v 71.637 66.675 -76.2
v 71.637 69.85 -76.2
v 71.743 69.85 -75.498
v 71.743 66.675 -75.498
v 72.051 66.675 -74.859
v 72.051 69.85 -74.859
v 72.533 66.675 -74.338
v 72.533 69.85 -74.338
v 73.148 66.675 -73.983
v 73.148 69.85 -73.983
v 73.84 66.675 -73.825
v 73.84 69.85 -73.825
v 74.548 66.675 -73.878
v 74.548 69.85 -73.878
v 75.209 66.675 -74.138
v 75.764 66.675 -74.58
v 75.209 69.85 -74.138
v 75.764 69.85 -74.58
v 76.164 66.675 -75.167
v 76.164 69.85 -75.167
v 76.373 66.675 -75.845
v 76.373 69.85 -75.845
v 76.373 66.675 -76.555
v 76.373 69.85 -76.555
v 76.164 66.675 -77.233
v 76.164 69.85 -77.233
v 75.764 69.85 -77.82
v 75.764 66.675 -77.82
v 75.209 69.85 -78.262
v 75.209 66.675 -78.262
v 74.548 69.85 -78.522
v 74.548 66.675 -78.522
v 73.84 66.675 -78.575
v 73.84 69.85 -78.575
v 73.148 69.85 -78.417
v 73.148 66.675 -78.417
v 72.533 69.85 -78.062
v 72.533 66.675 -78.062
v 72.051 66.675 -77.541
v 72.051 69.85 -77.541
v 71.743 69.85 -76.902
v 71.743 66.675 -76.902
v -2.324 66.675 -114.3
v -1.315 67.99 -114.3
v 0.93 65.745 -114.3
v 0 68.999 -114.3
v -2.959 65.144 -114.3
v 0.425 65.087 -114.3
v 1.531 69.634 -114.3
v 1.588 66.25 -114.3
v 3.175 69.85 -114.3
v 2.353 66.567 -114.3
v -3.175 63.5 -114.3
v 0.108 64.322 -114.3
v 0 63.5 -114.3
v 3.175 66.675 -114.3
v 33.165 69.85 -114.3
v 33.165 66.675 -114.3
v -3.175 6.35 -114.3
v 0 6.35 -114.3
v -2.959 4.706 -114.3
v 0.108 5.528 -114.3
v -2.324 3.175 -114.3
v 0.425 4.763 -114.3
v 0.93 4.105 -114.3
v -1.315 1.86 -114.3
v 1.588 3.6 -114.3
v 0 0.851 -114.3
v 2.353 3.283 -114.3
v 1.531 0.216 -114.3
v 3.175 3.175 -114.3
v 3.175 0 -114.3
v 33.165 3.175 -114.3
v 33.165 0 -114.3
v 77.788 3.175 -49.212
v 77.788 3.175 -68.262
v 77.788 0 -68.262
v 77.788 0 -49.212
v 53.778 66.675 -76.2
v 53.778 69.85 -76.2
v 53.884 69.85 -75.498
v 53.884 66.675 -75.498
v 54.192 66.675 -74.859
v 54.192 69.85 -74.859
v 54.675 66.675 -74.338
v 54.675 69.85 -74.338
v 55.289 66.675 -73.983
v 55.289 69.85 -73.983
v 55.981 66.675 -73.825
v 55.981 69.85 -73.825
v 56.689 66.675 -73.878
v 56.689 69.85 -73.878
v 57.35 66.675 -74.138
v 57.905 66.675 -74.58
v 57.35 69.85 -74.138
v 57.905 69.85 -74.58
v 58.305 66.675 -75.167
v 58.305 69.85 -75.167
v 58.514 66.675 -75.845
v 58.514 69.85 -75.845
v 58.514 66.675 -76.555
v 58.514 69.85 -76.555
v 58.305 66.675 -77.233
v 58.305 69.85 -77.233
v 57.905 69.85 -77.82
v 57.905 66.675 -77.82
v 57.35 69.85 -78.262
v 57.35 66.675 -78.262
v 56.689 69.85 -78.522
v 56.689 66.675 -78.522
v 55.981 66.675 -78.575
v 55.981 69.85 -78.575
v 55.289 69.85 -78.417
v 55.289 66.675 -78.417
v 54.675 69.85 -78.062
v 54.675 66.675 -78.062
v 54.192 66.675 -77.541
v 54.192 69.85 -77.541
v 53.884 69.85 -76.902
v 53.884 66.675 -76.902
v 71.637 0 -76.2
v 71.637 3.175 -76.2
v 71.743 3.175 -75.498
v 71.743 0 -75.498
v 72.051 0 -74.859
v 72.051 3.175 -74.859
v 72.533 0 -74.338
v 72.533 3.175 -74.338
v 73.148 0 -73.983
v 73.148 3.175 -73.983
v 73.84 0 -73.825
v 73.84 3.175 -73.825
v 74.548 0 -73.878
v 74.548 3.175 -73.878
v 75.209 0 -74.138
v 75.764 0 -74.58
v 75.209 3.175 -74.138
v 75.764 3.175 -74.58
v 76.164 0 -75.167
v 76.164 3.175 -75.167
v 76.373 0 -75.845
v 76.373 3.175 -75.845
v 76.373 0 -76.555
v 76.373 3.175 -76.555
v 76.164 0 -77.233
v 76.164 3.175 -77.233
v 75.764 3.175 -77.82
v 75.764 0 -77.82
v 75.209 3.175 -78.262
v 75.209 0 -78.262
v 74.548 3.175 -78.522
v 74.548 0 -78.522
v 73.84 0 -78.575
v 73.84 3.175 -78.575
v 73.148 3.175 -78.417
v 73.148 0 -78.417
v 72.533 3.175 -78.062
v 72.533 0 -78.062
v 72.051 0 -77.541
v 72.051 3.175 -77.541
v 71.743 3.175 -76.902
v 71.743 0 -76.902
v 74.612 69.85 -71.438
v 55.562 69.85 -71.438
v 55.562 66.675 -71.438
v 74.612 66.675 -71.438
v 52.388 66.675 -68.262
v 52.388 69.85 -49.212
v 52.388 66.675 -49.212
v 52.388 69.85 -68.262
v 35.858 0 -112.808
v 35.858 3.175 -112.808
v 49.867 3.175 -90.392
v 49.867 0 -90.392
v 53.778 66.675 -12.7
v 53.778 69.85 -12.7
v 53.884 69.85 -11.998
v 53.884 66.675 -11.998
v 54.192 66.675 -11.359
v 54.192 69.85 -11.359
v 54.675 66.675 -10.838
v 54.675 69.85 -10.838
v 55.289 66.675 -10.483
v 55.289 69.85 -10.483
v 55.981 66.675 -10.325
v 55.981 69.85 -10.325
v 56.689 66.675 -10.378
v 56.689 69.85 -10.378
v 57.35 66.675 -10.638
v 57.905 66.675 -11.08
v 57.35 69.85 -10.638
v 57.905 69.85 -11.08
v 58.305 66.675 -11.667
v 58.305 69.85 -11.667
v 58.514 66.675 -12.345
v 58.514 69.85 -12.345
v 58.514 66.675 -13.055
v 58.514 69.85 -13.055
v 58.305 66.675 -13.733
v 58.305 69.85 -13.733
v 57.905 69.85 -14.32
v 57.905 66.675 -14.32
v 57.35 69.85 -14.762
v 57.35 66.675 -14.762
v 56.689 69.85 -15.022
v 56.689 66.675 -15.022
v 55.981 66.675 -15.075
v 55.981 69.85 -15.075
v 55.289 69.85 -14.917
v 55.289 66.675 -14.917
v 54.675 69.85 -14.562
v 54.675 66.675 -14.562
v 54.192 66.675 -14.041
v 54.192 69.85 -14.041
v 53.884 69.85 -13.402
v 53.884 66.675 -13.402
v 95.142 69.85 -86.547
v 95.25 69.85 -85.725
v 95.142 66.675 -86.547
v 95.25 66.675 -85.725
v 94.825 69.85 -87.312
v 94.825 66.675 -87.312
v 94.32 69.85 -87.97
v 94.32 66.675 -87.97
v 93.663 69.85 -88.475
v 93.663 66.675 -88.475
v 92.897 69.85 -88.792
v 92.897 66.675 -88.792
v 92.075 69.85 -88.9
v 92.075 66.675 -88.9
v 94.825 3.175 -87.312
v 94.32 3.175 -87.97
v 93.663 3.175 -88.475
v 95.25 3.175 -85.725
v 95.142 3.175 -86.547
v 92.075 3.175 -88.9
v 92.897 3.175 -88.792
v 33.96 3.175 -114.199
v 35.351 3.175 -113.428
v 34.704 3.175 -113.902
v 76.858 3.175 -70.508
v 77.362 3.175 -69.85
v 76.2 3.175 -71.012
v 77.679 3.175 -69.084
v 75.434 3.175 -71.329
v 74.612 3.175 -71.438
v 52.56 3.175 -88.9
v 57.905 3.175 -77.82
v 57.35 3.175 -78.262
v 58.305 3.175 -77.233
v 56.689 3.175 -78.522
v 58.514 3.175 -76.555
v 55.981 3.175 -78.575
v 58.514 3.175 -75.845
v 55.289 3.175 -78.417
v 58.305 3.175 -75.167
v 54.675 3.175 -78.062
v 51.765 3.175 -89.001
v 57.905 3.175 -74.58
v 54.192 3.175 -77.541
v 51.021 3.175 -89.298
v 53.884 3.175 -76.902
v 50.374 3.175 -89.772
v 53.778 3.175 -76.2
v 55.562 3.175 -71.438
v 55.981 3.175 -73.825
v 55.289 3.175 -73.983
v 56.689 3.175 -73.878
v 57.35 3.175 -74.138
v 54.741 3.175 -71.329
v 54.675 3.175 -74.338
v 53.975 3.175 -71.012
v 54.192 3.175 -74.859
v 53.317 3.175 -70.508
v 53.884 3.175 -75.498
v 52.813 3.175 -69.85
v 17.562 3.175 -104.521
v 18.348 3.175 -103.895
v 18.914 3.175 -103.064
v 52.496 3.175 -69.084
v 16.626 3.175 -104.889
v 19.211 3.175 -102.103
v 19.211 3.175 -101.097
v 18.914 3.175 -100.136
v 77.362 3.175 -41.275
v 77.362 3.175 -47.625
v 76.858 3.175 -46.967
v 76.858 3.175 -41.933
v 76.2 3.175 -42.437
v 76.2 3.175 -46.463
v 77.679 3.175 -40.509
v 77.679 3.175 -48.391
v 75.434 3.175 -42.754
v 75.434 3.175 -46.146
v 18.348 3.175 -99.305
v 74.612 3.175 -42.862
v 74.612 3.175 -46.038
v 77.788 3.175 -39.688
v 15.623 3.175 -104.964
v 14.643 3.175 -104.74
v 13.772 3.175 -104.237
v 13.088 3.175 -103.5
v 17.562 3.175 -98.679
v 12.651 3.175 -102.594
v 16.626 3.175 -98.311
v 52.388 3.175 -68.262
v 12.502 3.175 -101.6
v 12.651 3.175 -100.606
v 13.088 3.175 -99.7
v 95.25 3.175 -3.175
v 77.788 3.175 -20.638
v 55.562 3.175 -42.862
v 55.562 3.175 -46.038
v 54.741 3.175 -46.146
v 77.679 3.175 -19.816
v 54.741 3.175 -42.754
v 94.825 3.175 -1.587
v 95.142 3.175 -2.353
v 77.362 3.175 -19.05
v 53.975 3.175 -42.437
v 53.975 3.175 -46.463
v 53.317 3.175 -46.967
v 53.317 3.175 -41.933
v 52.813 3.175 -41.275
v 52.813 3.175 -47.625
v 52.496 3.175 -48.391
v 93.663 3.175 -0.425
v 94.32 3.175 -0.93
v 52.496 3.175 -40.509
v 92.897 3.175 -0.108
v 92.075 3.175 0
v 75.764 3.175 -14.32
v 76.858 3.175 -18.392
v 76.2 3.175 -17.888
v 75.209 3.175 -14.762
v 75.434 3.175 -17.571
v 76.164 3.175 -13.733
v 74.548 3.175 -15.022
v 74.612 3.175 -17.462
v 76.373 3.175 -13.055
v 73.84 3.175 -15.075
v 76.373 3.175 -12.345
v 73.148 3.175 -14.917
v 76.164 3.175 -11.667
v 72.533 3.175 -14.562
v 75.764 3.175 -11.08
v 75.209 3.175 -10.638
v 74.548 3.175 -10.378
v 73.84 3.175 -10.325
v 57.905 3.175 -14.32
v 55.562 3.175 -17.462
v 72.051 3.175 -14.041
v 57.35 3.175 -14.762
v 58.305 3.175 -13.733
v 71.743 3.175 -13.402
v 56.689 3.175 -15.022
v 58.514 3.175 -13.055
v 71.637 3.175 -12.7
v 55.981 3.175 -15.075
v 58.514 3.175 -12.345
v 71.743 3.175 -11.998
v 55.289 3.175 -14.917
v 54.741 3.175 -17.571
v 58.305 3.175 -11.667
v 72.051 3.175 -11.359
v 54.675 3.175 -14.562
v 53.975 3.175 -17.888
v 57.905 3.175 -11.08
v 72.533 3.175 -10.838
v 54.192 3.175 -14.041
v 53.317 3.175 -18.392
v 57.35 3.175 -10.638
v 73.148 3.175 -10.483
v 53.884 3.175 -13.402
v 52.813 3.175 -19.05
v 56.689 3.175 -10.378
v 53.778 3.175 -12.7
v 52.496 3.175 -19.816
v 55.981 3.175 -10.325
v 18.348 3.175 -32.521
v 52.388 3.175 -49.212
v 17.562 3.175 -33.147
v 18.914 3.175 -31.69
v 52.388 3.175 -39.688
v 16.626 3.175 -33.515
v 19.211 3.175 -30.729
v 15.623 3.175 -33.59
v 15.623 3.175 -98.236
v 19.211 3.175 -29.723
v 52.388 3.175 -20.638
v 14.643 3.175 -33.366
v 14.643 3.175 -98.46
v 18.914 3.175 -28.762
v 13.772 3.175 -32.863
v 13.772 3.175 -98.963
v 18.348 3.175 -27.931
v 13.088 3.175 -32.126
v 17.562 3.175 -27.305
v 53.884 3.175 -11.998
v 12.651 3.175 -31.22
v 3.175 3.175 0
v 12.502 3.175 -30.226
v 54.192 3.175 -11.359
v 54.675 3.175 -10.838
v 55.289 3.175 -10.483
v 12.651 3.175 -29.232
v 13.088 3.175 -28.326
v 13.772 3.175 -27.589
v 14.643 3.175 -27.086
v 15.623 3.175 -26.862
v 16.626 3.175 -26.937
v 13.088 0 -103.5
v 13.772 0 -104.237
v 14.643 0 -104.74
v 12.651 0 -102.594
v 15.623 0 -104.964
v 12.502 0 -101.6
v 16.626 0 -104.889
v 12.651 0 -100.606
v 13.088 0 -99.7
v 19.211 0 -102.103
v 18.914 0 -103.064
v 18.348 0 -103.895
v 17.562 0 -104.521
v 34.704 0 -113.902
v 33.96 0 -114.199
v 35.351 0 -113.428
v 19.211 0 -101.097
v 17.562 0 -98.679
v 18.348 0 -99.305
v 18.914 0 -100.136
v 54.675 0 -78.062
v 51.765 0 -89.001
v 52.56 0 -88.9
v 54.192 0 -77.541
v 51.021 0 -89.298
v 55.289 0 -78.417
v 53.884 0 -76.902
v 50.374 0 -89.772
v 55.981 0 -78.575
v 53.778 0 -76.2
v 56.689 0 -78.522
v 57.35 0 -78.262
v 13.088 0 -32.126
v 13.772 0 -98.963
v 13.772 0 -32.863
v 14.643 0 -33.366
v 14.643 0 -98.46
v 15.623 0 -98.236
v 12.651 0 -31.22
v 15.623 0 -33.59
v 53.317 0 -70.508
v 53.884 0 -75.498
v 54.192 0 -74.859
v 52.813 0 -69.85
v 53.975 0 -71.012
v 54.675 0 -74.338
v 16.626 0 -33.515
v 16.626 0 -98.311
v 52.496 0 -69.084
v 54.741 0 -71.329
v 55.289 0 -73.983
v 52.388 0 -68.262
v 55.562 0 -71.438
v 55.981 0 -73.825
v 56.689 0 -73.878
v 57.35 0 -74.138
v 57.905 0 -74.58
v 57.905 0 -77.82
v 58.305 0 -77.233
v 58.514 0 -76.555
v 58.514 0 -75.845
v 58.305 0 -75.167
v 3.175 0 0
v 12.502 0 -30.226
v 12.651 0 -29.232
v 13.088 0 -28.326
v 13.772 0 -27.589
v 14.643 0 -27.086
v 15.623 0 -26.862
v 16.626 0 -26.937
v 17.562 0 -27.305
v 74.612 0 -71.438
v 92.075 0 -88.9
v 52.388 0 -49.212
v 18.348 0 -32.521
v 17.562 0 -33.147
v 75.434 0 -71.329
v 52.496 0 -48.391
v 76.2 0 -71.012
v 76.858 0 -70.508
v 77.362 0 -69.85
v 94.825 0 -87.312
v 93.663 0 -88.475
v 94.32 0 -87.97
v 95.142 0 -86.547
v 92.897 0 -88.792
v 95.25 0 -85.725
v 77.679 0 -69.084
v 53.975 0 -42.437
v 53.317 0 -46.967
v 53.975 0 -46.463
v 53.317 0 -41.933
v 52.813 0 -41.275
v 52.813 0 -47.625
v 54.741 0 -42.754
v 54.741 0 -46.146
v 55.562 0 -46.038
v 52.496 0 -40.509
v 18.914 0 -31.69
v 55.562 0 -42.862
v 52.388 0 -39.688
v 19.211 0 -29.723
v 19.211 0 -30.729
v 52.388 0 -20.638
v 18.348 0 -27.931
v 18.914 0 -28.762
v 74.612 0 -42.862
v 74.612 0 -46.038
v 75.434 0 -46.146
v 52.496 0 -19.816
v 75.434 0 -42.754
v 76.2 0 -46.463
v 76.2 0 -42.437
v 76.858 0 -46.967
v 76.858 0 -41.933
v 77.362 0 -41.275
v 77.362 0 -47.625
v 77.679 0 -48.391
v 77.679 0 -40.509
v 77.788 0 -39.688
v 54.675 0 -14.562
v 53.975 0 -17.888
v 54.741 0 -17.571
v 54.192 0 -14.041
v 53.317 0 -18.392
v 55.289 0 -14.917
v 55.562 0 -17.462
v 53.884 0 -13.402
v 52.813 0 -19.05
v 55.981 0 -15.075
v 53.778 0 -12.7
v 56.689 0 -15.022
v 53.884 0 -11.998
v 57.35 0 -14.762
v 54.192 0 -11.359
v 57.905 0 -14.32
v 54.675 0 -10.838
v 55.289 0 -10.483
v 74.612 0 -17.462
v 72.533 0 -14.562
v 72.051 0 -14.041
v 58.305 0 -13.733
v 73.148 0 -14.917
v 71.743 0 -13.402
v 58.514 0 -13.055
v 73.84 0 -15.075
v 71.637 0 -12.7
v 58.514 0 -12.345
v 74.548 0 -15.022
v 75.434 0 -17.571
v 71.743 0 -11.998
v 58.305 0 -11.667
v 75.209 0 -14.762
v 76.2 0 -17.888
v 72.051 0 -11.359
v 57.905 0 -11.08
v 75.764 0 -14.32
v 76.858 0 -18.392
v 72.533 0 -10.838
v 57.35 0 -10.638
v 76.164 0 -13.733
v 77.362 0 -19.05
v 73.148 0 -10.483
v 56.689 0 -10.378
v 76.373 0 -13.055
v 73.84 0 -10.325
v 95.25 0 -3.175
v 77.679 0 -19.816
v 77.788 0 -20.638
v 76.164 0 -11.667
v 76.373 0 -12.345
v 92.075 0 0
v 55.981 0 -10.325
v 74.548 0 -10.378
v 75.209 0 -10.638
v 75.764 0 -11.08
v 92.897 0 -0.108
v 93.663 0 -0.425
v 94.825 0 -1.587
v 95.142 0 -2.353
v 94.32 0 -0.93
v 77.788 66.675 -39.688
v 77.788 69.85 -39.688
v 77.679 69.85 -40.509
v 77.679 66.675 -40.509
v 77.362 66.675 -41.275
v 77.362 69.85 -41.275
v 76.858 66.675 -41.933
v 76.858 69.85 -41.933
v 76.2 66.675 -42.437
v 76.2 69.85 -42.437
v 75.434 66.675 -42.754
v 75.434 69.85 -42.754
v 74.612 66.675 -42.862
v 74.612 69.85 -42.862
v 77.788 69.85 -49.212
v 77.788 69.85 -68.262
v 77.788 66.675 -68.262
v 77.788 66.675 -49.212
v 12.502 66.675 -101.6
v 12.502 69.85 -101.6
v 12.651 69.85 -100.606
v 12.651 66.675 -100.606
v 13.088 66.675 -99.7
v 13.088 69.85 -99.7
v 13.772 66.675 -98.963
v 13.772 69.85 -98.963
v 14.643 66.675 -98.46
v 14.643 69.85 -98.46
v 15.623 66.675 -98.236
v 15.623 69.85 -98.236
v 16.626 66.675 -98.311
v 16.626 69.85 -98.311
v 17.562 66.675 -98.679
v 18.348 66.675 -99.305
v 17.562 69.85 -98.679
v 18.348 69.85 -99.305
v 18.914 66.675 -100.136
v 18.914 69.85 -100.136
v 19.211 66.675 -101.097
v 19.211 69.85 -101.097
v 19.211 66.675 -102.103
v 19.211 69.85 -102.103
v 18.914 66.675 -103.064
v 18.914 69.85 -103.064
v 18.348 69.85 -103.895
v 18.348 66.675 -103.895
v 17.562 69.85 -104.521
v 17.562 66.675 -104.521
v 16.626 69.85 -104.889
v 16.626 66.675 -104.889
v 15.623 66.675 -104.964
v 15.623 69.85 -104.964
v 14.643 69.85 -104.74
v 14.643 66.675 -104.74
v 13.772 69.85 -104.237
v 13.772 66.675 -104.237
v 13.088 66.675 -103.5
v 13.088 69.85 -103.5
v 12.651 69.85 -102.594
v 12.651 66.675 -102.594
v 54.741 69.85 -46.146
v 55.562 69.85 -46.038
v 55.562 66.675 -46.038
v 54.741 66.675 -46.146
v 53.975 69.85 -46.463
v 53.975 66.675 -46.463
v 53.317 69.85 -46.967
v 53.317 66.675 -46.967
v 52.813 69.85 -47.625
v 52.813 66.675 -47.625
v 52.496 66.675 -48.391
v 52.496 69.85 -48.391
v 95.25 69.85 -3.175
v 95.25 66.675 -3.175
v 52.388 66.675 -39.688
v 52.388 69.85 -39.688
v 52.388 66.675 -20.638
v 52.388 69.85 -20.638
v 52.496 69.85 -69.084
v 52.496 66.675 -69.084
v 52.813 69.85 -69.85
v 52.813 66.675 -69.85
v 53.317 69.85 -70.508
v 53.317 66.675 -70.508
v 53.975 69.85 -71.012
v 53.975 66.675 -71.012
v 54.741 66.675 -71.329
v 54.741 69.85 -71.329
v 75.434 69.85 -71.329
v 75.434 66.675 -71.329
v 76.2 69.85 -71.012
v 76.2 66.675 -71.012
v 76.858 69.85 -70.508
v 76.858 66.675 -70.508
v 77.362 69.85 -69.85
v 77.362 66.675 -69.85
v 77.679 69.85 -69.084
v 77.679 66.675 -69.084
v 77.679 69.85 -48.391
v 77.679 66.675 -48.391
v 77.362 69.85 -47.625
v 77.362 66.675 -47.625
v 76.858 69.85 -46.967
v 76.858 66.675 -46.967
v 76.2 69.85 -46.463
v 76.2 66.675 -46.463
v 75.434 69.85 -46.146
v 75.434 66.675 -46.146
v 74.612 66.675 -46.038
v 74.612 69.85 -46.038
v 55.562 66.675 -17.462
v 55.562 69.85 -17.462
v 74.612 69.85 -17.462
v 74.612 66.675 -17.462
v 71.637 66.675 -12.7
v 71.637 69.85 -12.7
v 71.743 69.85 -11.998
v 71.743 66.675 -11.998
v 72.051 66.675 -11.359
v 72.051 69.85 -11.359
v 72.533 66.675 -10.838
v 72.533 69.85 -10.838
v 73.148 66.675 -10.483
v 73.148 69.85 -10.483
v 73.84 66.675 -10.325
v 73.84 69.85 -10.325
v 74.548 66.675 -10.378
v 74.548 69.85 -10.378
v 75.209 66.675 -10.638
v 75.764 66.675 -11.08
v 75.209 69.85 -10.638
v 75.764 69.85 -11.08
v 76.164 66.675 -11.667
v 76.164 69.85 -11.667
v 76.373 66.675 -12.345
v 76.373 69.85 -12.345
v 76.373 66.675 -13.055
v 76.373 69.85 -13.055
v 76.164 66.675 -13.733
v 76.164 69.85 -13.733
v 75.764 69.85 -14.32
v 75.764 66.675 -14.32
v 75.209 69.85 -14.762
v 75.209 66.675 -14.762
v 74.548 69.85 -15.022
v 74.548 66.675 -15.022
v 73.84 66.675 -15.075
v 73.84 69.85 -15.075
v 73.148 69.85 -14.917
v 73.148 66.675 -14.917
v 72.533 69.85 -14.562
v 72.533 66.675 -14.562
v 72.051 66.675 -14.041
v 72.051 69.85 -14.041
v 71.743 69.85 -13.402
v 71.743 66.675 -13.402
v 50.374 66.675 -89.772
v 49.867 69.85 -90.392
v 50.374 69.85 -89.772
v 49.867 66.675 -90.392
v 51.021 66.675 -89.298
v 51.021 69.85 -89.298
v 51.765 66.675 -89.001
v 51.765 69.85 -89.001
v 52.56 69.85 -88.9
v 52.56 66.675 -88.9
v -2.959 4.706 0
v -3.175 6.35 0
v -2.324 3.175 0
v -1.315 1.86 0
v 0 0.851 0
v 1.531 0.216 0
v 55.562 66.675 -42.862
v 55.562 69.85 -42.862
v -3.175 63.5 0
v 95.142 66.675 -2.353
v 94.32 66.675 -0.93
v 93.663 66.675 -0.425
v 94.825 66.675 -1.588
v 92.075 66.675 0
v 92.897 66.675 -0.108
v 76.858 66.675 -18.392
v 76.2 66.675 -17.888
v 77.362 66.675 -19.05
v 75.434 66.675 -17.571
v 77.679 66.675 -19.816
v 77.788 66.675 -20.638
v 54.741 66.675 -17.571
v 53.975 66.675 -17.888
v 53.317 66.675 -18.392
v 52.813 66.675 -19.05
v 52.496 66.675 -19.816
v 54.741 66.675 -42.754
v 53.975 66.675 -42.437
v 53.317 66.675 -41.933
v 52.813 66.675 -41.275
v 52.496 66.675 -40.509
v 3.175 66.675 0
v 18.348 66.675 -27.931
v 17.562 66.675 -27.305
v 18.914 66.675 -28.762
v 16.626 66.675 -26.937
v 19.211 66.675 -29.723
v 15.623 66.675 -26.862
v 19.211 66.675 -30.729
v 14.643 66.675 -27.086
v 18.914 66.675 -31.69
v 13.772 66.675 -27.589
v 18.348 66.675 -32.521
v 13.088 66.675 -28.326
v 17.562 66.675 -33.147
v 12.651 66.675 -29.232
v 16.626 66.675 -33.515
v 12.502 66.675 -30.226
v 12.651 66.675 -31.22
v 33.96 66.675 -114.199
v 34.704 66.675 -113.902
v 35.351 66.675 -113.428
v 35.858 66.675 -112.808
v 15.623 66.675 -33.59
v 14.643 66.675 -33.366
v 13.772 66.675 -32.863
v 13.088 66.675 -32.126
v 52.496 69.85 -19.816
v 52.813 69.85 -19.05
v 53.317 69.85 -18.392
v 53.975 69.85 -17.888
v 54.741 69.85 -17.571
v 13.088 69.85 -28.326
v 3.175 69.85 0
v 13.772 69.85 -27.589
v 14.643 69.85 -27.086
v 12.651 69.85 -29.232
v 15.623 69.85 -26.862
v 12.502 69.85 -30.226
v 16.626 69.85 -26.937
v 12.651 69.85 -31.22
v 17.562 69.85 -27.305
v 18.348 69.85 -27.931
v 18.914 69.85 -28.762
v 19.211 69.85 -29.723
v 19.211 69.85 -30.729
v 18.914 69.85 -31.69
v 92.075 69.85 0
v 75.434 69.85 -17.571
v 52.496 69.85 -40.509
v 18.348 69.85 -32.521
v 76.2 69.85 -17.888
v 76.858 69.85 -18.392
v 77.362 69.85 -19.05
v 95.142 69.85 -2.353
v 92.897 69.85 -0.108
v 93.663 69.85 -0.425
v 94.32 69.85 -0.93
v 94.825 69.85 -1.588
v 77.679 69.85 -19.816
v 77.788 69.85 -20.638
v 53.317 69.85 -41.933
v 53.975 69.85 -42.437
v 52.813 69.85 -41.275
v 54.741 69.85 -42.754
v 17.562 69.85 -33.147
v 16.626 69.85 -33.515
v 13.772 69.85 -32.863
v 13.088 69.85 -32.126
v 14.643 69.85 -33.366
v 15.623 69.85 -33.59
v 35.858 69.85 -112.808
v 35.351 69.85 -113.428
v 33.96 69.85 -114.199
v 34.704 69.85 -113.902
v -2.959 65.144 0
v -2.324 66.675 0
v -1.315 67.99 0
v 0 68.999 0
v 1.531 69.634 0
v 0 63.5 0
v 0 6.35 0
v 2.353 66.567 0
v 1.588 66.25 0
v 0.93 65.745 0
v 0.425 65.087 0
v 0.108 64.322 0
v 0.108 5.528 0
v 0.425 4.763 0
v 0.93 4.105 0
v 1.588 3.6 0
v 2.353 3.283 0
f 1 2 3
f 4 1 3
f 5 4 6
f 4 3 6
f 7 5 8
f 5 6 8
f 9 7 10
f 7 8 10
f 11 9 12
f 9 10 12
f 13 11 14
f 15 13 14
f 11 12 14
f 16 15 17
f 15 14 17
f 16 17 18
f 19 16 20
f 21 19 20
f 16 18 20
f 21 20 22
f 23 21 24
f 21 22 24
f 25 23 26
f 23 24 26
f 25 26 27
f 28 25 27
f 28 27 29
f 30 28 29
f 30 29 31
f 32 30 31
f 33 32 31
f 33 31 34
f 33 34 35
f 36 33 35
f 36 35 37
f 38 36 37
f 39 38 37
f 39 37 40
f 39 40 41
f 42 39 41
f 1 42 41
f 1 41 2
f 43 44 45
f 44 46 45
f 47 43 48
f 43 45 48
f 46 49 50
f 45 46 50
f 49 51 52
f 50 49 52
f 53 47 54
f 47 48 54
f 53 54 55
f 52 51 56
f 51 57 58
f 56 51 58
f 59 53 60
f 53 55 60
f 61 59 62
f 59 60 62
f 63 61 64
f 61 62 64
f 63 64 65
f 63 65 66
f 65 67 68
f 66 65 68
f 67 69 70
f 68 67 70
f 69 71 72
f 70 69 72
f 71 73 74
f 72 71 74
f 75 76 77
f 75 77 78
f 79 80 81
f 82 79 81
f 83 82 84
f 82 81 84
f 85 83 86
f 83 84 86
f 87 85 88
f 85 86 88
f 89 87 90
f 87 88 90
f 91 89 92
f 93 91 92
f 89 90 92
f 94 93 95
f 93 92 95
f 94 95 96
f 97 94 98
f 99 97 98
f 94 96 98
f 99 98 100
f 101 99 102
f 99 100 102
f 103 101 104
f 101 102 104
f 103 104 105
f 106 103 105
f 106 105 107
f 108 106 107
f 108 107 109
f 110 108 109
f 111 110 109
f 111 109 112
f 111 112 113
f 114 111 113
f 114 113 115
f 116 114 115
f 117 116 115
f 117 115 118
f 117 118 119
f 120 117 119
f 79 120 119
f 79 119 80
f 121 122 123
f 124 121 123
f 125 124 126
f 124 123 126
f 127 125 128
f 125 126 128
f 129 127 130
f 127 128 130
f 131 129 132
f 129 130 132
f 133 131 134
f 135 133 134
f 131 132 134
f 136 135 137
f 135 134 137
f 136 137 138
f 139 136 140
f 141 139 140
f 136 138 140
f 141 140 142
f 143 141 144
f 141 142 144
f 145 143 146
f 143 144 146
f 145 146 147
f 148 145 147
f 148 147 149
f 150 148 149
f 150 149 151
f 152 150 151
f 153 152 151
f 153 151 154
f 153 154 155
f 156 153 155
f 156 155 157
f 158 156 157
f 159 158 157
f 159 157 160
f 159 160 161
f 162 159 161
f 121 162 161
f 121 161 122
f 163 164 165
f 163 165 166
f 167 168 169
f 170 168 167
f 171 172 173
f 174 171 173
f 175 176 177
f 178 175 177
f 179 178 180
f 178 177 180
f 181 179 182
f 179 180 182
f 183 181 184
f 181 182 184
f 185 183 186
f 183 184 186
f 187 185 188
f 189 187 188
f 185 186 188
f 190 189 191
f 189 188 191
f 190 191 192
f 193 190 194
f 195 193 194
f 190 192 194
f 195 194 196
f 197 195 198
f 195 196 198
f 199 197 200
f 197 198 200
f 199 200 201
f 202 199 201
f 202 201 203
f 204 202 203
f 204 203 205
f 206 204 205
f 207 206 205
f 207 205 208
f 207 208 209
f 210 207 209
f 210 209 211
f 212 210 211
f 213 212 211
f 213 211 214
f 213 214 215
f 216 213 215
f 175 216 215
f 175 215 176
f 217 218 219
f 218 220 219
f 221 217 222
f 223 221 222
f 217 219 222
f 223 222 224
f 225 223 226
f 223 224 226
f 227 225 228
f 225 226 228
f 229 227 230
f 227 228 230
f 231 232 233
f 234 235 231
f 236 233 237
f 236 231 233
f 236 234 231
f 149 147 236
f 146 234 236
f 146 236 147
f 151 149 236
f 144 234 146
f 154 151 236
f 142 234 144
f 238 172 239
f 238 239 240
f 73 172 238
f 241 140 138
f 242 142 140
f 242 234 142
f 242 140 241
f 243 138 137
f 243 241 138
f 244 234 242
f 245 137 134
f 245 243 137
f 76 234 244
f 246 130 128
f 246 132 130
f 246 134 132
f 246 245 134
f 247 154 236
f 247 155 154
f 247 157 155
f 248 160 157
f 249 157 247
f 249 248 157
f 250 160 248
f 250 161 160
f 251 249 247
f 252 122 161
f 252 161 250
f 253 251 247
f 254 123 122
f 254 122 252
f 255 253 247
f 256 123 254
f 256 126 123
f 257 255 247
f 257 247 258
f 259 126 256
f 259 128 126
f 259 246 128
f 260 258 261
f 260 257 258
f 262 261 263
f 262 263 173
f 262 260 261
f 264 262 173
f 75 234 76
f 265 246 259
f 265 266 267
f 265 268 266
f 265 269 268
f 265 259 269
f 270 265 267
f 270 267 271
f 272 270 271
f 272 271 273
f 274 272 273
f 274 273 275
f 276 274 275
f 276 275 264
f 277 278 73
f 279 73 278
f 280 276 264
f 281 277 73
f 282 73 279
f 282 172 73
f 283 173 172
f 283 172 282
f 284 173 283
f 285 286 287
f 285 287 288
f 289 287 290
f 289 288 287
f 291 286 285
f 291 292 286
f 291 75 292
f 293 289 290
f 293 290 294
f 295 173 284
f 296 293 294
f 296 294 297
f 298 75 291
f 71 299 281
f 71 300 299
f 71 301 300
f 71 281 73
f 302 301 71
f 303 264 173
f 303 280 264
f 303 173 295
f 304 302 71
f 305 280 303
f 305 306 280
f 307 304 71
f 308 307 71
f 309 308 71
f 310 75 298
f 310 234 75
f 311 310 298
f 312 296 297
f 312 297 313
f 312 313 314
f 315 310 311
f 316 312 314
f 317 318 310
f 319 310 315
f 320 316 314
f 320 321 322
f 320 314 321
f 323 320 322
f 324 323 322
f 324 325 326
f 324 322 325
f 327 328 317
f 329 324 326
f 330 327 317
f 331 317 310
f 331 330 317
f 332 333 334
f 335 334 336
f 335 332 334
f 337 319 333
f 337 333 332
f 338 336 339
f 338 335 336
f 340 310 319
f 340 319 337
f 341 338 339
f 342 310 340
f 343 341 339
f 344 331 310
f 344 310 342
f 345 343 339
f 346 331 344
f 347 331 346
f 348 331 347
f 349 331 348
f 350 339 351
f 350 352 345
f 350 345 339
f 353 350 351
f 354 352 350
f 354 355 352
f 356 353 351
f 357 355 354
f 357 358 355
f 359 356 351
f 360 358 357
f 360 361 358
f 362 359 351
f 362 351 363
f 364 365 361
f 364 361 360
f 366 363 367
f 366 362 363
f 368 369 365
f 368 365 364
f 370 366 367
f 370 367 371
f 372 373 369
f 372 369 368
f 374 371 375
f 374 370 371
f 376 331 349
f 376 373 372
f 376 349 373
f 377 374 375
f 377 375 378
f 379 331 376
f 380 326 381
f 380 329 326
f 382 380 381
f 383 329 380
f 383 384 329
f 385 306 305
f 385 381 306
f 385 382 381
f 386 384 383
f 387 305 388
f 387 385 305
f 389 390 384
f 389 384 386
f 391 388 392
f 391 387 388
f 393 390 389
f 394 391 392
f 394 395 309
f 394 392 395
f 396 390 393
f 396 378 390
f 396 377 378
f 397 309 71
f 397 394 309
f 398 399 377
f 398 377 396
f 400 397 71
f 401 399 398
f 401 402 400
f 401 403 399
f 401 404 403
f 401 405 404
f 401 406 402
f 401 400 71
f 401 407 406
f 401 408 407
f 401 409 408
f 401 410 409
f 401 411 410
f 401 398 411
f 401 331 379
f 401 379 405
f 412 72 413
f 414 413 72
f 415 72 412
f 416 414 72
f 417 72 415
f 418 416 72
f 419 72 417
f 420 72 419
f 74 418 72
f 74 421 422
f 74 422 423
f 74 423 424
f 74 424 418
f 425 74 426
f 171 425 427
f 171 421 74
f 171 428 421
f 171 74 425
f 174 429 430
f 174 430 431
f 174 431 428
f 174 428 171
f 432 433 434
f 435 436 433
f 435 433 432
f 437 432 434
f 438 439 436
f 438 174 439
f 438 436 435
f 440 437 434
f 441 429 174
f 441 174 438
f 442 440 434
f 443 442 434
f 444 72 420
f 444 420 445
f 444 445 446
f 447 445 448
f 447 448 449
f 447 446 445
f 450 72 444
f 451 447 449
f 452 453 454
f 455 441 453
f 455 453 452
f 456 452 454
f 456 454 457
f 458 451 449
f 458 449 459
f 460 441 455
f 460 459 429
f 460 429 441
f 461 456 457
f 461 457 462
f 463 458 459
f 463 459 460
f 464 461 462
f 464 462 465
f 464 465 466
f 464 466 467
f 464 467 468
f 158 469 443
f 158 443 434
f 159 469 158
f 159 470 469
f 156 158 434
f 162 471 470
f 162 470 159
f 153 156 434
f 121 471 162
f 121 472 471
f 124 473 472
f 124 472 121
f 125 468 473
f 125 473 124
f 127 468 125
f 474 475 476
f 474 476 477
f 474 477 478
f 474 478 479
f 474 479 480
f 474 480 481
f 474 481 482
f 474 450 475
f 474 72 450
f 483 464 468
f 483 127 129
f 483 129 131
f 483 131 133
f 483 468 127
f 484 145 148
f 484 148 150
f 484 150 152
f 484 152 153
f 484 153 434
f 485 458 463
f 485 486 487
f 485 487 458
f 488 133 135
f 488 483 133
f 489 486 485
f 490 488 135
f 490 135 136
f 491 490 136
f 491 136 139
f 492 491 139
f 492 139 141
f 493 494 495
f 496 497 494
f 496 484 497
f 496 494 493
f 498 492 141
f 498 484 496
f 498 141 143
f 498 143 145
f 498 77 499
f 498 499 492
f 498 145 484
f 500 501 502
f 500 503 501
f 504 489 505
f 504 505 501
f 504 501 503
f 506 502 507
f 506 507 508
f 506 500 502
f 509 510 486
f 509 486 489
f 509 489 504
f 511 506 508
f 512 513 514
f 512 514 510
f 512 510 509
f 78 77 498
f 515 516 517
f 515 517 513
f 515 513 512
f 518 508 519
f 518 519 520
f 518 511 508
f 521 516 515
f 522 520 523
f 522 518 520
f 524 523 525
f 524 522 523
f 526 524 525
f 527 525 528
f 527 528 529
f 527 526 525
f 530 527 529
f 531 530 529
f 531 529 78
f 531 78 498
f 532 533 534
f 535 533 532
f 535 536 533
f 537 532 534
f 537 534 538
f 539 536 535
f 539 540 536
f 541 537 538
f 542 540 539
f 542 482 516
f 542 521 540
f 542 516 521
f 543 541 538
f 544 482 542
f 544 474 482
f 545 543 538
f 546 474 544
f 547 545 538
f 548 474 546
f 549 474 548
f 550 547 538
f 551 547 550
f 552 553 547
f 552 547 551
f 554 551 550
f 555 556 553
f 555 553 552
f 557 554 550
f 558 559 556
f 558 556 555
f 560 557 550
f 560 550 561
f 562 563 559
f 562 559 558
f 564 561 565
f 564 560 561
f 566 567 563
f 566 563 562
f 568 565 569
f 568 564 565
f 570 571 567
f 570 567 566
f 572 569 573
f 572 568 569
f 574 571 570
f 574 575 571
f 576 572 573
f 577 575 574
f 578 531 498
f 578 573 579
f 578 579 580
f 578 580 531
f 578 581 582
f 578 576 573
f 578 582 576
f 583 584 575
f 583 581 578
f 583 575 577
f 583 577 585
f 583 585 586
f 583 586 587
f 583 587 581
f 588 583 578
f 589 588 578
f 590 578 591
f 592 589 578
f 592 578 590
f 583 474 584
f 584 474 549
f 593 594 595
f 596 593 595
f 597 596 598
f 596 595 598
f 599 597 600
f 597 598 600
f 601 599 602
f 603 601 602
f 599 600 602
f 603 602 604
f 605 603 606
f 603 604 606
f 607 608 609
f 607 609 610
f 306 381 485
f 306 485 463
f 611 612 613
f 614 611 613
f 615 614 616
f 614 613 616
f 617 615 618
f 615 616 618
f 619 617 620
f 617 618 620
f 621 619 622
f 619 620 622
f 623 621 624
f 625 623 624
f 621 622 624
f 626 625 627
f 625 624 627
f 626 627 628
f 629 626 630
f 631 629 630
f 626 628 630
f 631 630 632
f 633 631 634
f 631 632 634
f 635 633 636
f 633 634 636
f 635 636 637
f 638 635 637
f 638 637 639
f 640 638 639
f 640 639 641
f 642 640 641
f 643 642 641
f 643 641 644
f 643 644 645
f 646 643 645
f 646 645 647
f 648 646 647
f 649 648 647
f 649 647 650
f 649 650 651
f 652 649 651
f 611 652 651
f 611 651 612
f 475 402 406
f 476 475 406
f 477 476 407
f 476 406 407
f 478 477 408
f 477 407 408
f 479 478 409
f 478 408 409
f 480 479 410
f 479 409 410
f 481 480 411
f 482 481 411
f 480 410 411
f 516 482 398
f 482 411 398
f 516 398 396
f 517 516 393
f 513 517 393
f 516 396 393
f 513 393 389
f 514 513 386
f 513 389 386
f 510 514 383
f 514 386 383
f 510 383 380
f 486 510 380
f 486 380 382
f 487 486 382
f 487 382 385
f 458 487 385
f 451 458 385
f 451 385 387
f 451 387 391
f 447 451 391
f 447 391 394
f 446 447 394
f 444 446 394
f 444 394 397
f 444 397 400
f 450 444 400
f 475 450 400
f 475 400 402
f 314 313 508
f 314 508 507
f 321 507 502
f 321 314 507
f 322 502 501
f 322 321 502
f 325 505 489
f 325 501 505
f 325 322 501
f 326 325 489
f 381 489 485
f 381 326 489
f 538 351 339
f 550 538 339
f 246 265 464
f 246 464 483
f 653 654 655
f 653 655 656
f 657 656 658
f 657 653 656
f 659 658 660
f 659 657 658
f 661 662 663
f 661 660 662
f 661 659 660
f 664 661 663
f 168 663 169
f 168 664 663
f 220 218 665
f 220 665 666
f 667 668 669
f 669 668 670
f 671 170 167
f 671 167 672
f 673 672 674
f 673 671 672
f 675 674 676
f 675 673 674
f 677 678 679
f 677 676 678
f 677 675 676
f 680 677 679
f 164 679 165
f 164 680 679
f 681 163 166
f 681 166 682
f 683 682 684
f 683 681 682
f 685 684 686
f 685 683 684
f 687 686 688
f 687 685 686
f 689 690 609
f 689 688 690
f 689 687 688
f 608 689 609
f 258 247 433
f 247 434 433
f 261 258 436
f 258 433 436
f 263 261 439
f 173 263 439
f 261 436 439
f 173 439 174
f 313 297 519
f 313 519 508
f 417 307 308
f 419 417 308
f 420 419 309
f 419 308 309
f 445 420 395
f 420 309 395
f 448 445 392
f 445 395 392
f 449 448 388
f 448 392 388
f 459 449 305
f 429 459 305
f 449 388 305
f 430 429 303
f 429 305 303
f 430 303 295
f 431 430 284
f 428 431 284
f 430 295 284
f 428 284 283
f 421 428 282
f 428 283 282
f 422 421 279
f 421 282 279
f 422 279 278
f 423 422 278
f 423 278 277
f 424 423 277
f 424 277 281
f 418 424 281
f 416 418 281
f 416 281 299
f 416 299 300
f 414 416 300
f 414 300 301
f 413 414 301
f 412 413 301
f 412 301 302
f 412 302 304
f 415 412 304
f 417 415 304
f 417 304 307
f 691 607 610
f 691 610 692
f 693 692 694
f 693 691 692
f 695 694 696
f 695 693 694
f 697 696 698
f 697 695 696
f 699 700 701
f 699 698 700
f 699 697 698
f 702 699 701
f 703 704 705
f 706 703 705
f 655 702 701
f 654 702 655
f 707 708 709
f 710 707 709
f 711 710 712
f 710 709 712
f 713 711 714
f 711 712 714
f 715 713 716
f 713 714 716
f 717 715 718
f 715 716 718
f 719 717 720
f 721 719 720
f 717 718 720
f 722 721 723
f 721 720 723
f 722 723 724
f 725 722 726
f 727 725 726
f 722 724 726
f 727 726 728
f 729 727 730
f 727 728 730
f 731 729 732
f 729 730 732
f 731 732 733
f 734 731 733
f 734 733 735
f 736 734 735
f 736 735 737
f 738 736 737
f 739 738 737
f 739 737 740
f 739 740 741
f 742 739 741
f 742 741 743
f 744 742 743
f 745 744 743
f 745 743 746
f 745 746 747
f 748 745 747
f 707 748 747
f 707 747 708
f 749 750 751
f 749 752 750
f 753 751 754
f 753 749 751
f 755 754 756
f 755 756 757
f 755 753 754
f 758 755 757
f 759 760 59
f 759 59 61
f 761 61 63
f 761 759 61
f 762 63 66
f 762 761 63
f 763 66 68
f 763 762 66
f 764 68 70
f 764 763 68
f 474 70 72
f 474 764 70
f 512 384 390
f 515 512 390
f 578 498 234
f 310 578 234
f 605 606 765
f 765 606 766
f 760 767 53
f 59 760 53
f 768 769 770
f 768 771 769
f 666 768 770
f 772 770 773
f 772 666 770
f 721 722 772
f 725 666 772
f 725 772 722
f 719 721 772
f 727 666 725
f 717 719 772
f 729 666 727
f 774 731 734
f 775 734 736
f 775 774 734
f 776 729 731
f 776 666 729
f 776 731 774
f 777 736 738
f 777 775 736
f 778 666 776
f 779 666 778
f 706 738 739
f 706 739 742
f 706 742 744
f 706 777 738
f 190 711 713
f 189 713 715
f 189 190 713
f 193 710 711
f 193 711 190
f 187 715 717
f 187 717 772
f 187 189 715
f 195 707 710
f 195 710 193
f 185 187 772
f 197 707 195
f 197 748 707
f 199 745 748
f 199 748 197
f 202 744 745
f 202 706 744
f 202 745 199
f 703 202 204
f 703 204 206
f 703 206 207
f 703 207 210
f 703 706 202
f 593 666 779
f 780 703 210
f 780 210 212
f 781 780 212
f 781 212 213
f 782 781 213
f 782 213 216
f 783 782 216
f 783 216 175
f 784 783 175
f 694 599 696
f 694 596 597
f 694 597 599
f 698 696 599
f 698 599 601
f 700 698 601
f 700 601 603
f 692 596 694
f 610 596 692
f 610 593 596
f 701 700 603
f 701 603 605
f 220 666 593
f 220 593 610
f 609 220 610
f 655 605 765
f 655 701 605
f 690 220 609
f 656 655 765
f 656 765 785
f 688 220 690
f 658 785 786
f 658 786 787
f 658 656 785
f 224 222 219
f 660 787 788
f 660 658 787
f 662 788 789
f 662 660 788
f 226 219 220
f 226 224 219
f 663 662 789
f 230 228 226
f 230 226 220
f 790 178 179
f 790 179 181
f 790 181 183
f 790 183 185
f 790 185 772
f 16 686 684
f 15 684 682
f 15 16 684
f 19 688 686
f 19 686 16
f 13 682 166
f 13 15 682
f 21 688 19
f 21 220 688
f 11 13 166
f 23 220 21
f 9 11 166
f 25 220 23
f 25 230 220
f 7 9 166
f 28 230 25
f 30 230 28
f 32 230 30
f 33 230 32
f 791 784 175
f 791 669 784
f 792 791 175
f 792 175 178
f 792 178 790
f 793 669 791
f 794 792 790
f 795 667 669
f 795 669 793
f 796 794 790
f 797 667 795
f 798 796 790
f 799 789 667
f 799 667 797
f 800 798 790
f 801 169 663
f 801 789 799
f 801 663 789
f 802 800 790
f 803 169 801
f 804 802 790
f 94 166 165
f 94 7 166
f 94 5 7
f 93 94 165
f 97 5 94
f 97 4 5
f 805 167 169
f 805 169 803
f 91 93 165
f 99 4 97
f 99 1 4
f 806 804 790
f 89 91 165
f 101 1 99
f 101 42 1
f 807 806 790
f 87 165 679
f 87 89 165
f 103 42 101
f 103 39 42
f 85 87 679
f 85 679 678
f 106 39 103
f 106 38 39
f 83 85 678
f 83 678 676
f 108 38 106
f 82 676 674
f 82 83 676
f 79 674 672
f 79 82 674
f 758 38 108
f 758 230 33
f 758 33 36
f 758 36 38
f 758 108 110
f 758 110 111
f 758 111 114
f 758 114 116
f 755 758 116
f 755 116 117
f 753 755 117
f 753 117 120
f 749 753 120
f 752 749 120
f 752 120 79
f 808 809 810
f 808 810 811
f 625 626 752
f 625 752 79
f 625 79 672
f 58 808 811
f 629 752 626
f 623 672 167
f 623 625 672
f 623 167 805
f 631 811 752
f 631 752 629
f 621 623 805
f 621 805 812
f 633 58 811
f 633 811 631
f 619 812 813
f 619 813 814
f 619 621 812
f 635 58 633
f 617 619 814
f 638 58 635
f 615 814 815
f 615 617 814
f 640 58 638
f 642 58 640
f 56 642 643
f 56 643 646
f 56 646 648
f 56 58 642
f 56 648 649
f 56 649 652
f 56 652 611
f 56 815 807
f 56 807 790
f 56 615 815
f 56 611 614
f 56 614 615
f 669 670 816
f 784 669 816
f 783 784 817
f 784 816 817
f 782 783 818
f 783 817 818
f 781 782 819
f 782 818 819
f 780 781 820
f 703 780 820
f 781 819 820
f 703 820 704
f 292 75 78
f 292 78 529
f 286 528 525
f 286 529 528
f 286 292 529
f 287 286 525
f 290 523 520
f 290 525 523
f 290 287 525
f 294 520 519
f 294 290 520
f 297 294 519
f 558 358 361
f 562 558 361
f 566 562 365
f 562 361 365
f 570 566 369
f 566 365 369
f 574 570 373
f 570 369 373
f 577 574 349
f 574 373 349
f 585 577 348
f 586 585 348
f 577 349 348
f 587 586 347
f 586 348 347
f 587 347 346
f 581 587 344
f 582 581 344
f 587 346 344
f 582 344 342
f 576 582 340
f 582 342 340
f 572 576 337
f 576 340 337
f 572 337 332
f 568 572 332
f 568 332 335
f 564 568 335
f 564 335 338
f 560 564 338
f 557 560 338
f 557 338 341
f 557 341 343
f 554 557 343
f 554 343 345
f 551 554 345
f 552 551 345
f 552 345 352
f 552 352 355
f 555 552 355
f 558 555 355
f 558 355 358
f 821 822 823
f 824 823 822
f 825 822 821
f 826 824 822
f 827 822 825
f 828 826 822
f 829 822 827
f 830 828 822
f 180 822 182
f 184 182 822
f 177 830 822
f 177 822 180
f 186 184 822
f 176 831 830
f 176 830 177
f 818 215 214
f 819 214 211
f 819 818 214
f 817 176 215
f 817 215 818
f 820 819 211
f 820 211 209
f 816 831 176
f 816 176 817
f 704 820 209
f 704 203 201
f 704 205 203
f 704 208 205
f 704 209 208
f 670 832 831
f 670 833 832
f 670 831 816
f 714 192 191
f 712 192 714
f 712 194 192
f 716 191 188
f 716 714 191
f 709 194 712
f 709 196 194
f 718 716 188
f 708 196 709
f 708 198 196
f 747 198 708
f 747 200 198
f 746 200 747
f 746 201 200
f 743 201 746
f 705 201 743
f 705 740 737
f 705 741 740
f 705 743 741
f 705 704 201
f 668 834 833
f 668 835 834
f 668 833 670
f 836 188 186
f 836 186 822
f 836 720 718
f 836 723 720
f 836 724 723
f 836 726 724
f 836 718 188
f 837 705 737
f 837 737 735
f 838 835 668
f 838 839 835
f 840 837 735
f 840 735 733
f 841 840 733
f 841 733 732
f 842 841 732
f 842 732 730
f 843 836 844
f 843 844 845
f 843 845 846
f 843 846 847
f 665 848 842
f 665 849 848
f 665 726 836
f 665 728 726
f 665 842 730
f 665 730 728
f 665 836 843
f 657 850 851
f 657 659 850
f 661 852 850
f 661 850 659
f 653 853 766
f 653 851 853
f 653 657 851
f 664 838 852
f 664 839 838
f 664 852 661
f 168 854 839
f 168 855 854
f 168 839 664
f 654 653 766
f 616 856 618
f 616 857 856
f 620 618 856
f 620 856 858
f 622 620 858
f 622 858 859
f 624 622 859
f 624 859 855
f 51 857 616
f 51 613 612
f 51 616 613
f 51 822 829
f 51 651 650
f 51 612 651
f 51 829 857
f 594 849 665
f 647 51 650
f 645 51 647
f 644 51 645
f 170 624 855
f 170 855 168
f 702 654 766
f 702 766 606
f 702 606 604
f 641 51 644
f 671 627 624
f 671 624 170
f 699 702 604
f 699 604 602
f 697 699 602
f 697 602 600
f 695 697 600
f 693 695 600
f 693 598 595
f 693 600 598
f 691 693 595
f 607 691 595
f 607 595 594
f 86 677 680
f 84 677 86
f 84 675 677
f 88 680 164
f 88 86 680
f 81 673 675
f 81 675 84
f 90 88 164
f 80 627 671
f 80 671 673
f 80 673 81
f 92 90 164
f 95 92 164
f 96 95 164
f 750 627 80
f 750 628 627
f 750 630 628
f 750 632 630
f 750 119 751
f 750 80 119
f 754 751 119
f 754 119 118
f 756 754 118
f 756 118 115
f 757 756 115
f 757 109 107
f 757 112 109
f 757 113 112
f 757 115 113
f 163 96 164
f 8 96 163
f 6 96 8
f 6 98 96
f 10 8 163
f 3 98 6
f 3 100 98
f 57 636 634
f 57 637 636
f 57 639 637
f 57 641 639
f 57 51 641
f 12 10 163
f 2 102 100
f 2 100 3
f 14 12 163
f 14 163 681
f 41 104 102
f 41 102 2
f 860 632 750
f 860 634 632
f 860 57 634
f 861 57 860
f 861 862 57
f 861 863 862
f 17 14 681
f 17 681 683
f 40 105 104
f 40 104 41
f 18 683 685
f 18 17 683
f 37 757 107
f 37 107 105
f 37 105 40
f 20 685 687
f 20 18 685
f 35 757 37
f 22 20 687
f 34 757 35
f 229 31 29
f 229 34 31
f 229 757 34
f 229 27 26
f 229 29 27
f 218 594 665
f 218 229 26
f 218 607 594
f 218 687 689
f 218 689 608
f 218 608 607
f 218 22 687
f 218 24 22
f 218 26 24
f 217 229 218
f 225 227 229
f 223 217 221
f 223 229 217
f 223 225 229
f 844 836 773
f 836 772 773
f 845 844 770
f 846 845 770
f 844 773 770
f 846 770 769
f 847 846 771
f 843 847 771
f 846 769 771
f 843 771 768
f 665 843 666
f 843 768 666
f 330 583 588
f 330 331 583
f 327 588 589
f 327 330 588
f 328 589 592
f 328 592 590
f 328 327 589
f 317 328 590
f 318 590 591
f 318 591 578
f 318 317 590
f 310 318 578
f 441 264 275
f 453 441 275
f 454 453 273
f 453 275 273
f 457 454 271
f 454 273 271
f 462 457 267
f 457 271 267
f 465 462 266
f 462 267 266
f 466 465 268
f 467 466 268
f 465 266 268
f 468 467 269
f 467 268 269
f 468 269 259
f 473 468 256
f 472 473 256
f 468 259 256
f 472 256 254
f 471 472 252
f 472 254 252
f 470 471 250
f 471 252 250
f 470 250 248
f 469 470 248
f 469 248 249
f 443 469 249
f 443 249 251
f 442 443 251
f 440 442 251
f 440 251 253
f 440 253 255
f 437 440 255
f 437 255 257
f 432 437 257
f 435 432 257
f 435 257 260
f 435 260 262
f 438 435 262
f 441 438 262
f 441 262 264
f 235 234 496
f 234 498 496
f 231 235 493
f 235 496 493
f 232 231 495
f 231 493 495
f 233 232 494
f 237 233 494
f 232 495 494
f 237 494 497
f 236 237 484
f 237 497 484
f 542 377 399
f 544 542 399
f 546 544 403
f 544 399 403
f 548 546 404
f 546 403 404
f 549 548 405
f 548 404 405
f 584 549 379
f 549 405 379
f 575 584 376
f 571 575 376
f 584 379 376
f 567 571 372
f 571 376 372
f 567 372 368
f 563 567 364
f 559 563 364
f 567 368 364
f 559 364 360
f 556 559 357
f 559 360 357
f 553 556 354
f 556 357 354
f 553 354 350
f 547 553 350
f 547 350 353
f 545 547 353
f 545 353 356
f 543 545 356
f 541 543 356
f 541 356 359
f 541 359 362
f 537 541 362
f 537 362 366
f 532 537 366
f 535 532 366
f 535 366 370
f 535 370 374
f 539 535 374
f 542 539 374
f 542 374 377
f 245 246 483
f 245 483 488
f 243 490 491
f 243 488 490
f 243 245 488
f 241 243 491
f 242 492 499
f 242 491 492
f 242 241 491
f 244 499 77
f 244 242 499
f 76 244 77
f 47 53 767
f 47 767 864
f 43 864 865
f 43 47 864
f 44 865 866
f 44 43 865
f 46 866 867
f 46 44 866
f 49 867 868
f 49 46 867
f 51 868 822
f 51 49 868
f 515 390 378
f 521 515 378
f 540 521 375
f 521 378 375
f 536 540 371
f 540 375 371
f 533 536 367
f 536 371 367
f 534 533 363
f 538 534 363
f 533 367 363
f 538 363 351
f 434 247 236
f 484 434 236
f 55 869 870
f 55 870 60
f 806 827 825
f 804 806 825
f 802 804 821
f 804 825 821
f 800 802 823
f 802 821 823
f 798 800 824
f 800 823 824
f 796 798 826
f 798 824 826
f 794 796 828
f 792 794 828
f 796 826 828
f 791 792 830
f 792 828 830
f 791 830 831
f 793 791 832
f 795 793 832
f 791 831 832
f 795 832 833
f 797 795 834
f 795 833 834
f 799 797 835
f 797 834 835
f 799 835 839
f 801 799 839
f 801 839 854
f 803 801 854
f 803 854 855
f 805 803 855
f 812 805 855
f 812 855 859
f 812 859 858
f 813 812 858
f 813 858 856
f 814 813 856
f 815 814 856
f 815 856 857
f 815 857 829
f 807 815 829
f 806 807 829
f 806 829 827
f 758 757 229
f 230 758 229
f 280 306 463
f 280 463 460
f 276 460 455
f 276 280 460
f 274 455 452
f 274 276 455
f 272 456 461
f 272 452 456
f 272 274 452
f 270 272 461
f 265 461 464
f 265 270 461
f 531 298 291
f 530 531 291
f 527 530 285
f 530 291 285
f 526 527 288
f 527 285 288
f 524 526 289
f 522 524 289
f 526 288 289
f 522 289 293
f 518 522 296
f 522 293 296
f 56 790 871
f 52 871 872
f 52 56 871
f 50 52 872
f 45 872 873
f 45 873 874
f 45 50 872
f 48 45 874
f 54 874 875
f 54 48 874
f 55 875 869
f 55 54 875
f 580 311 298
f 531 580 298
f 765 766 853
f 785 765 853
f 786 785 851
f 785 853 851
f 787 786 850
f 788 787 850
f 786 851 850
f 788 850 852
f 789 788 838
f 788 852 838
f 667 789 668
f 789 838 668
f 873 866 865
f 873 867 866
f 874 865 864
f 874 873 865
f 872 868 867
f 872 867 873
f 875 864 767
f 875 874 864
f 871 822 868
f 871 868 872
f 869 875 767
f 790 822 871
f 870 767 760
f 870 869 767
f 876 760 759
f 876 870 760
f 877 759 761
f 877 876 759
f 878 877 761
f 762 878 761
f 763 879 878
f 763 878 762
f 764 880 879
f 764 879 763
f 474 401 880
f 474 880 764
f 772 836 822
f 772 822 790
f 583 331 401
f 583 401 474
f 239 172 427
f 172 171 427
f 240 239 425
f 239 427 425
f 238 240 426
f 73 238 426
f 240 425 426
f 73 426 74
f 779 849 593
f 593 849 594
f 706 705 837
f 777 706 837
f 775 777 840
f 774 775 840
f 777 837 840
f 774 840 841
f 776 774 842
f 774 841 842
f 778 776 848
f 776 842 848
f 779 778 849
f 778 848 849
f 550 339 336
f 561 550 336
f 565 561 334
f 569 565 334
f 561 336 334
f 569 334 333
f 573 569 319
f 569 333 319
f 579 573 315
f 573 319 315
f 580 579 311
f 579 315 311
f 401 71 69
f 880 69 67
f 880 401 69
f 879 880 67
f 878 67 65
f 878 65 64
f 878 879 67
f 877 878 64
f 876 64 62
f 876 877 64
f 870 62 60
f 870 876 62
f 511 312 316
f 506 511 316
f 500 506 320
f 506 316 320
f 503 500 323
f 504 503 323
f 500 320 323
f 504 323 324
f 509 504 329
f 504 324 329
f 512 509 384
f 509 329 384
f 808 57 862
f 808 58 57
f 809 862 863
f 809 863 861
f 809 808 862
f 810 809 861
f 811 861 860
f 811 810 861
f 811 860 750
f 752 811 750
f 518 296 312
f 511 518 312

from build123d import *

# Parameters (mm, degrees)
SKETCH1_W                      = 114.3
SKETCH1_H                      = 69.85
BASE_FLANGE1_DEPTH             = 3.175
EDGE_FLANGE1_STRIP_W           = 19.05
EDGE_FLANGE1_STRIP_H           = 3.175
EDGE_FLANGE1_STRIP_CUT_DEPTH   = 114.3
EDGE_FLANGE1_STRIP_2_W         = 19.05
EDGE_FLANGE1_STRIP_2_H         = 3.175
EDGE_FLANGE1_STRIP_CUT_2_DEPTH = 114.3
EDGE_FLANGE1_DEPTH             = 114.3
EDGE_FLANGE1_BEND_DEPTH        = 114.3
SKETCH12_R                     = 2.38125
SKETCH12_R_2                   = 3.3734375
CUT_EXTRUDE1_DEPTH             = 165.36567464
FILLET1_R                      = 3.175


# Sheet-metal steps are written as plain solids
with BuildPart() as part:
    # Sketch1 → Base-Flange1 (new body)
    with BuildSketch(Plane(origin=(0, 0, 0), x_dir=(0, 0, -1), z_dir=(1, 0, 0))):
        with Locations((57.15, 34.925)):
            Rectangle(SKETCH1_W, SKETCH1_H)
    extrude(amount=-BASE_FLANGE1_DEPTH)

    # Edge-Flange1 strip (across the edge) → Edge-Flange1 strip cut (cut)
    with BuildSketch(Plane(origin=(0, 69.85, -114.3), x_dir=(0, -1, 0), z_dir=(0, 0, 1))):
        with Locations((-3.175, -1.5875)):
            Rectangle(EDGE_FLANGE1_STRIP_W, EDGE_FLANGE1_STRIP_H)
    extrude(amount=EDGE_FLANGE1_STRIP_CUT_DEPTH, mode=Mode.SUBTRACT)

    # Edge-Flange1 strip 2 (across the edge) → Edge-Flange1 strip cut 2 (cut)
    with BuildSketch(Plane.YX):
        with Locations((-3.175, -1.5875)):
            Rectangle(EDGE_FLANGE1_STRIP_2_W, EDGE_FLANGE1_STRIP_2_H)
    extrude(amount=EDGE_FLANGE1_STRIP_CUT_2_DEPTH, mode=Mode.SUBTRACT)

    # Edge-Flange1 section (across the edge) → Edge-Flange1 (add)
    with BuildSketch(Plane(origin=(0, 69.85, -114.3), x_dir=(0, -1, 0), z_dir=(0, 0, 1))):
        with BuildLine():
            Line((0, 3.175), (0, 95.25))
            Line((0, 95.25), (3.175, 95.25))
            Line((3.175, 95.25), (3.175, 3.175))
            ThreePointArc((3.175, 3.175), (4.10493597, 0.92993597), (6.35, 0))
            Line((6.35, 0), (6.35, -3.175))
            ThreePointArc((6.35, -3.175), (1.859871939, -1.315128061), (0, 3.175))
        make_face()
    extrude(amount=EDGE_FLANGE1_DEPTH)

    # Edge-Flange1 section 2 (across the edge) → Edge-Flange1 bend (add)
    with BuildSketch(Plane.YX):
        with BuildLine():
            Line((0, 3.175), (0, 95.25))
            Line((0, 95.25), (3.175, 95.25))
            Line((3.175, 95.25), (3.175, 3.175))
            ThreePointArc((3.175, 3.175), (4.10493597, 0.92993597), (6.35, 0))
            Line((6.35, 0), (6.35, -3.175))
            ThreePointArc((6.35, -3.175), (1.859871939, -1.315128061), (0, 3.175))
        make_face()
    extrude(amount=EDGE_FLANGE1_BEND_DEPTH)

    # Sketch12 → Cut-Extrude1 (cut, through all)
    with BuildSketch(Plane(origin=(0, 69.85, 0), x_dir=(1, 0, 0), z_dir=(0, 1, 0))):
        with Locations(Location((56.1594, 76.2, 0), (0, 0, 180))):
            Circle(SKETCH12_R)
        with Locations(Location((74.01814, 76.2, 0), (0, 0, 180))):
            Circle(SKETCH12_R)
        with Locations(Location((56.1594, 12.7, 0), (0, 0, 180))):
            Circle(SKETCH12_R)
        with Locations(Location((74.01814, 12.7, 0), (0, 0, 180))):
            Circle(SKETCH12_R)
        with Locations(Location((15.875, 101.6, 0), (0, 0, 180))):
            Circle(SKETCH12_R_2)
        with Locations(Location((15.875, 30.226, 0), (0, 0, 180))):
            Circle(SKETCH12_R_2)
        Polygon((34.925, 114.3), (50.8, 88.9), (95.25, 88.9), (95.25, 114.3), align=None)
        with BuildLine():
            Line((55.5625, 71.4375), (74.6125, 71.4375))
            ThreePointArc((74.6125, 71.4375), (76.85756403, 70.50756403), (77.7875, 68.2625))
            Line((77.7875, 68.2625), (77.7875, 49.2125))
            ThreePointArc((77.7875, 49.2125), (76.85756403, 46.96743597), (74.6125, 46.0375))
            Line((74.6125, 46.0375), (55.5625, 46.0375))
            ThreePointArc((55.5625, 46.0375), (53.31743597, 46.96743597), (52.3875, 49.2125))
            Line((52.3875, 49.2125), (52.3875, 68.2625))
            ThreePointArc((52.3875, 68.2625), (53.31743597, 70.50756403), (55.5625, 71.4375))
        make_face()
        with BuildLine():
            Line((74.6125, 42.8625), (55.5625, 42.8625))
            ThreePointArc((55.5625, 42.8625), (53.31743597, 41.93256403), (52.3875, 39.6875))
            Line((52.3875, 39.6875), (52.3875, 20.6375))
            ThreePointArc((52.3875, 20.6375), (53.31743597, 18.39243597), (55.5625, 17.4625))
            Line((55.5625, 17.4625), (74.6125, 17.4625))
            ThreePointArc((74.6125, 17.4625), (76.85756403, 18.39243597), (77.7875, 20.6375))
            Line((77.7875, 20.6375), (77.7875, 39.6875))
            ThreePointArc((77.7875, 39.6875), (76.85756403, 41.93256403), (74.6125, 42.8625))
        make_face()
    extrude(amount=-CUT_EXTRUDE1_DEPTH, mode=Mode.SUBTRACT)

    # Fillet1
    fillet1_edges = [part.edges().sort_by_distance(p)[0] for p in [
        (50.8, 68.2625, -88.9),
        (34.925, 68.2625, -114.3),
        (95.25, 68.2625, -88.9),
        (34.925, 1.5875, -114.3),
        (95.25, 1.5875, -88.9),
        (50.8, 1.5875, -88.9),
        (95.25, 68.2625, 0),
        (95.25, 1.5875, 0),
    ]]
    fillet(fillet1_edges, radius=FILLET1_R)


solid = part.part
